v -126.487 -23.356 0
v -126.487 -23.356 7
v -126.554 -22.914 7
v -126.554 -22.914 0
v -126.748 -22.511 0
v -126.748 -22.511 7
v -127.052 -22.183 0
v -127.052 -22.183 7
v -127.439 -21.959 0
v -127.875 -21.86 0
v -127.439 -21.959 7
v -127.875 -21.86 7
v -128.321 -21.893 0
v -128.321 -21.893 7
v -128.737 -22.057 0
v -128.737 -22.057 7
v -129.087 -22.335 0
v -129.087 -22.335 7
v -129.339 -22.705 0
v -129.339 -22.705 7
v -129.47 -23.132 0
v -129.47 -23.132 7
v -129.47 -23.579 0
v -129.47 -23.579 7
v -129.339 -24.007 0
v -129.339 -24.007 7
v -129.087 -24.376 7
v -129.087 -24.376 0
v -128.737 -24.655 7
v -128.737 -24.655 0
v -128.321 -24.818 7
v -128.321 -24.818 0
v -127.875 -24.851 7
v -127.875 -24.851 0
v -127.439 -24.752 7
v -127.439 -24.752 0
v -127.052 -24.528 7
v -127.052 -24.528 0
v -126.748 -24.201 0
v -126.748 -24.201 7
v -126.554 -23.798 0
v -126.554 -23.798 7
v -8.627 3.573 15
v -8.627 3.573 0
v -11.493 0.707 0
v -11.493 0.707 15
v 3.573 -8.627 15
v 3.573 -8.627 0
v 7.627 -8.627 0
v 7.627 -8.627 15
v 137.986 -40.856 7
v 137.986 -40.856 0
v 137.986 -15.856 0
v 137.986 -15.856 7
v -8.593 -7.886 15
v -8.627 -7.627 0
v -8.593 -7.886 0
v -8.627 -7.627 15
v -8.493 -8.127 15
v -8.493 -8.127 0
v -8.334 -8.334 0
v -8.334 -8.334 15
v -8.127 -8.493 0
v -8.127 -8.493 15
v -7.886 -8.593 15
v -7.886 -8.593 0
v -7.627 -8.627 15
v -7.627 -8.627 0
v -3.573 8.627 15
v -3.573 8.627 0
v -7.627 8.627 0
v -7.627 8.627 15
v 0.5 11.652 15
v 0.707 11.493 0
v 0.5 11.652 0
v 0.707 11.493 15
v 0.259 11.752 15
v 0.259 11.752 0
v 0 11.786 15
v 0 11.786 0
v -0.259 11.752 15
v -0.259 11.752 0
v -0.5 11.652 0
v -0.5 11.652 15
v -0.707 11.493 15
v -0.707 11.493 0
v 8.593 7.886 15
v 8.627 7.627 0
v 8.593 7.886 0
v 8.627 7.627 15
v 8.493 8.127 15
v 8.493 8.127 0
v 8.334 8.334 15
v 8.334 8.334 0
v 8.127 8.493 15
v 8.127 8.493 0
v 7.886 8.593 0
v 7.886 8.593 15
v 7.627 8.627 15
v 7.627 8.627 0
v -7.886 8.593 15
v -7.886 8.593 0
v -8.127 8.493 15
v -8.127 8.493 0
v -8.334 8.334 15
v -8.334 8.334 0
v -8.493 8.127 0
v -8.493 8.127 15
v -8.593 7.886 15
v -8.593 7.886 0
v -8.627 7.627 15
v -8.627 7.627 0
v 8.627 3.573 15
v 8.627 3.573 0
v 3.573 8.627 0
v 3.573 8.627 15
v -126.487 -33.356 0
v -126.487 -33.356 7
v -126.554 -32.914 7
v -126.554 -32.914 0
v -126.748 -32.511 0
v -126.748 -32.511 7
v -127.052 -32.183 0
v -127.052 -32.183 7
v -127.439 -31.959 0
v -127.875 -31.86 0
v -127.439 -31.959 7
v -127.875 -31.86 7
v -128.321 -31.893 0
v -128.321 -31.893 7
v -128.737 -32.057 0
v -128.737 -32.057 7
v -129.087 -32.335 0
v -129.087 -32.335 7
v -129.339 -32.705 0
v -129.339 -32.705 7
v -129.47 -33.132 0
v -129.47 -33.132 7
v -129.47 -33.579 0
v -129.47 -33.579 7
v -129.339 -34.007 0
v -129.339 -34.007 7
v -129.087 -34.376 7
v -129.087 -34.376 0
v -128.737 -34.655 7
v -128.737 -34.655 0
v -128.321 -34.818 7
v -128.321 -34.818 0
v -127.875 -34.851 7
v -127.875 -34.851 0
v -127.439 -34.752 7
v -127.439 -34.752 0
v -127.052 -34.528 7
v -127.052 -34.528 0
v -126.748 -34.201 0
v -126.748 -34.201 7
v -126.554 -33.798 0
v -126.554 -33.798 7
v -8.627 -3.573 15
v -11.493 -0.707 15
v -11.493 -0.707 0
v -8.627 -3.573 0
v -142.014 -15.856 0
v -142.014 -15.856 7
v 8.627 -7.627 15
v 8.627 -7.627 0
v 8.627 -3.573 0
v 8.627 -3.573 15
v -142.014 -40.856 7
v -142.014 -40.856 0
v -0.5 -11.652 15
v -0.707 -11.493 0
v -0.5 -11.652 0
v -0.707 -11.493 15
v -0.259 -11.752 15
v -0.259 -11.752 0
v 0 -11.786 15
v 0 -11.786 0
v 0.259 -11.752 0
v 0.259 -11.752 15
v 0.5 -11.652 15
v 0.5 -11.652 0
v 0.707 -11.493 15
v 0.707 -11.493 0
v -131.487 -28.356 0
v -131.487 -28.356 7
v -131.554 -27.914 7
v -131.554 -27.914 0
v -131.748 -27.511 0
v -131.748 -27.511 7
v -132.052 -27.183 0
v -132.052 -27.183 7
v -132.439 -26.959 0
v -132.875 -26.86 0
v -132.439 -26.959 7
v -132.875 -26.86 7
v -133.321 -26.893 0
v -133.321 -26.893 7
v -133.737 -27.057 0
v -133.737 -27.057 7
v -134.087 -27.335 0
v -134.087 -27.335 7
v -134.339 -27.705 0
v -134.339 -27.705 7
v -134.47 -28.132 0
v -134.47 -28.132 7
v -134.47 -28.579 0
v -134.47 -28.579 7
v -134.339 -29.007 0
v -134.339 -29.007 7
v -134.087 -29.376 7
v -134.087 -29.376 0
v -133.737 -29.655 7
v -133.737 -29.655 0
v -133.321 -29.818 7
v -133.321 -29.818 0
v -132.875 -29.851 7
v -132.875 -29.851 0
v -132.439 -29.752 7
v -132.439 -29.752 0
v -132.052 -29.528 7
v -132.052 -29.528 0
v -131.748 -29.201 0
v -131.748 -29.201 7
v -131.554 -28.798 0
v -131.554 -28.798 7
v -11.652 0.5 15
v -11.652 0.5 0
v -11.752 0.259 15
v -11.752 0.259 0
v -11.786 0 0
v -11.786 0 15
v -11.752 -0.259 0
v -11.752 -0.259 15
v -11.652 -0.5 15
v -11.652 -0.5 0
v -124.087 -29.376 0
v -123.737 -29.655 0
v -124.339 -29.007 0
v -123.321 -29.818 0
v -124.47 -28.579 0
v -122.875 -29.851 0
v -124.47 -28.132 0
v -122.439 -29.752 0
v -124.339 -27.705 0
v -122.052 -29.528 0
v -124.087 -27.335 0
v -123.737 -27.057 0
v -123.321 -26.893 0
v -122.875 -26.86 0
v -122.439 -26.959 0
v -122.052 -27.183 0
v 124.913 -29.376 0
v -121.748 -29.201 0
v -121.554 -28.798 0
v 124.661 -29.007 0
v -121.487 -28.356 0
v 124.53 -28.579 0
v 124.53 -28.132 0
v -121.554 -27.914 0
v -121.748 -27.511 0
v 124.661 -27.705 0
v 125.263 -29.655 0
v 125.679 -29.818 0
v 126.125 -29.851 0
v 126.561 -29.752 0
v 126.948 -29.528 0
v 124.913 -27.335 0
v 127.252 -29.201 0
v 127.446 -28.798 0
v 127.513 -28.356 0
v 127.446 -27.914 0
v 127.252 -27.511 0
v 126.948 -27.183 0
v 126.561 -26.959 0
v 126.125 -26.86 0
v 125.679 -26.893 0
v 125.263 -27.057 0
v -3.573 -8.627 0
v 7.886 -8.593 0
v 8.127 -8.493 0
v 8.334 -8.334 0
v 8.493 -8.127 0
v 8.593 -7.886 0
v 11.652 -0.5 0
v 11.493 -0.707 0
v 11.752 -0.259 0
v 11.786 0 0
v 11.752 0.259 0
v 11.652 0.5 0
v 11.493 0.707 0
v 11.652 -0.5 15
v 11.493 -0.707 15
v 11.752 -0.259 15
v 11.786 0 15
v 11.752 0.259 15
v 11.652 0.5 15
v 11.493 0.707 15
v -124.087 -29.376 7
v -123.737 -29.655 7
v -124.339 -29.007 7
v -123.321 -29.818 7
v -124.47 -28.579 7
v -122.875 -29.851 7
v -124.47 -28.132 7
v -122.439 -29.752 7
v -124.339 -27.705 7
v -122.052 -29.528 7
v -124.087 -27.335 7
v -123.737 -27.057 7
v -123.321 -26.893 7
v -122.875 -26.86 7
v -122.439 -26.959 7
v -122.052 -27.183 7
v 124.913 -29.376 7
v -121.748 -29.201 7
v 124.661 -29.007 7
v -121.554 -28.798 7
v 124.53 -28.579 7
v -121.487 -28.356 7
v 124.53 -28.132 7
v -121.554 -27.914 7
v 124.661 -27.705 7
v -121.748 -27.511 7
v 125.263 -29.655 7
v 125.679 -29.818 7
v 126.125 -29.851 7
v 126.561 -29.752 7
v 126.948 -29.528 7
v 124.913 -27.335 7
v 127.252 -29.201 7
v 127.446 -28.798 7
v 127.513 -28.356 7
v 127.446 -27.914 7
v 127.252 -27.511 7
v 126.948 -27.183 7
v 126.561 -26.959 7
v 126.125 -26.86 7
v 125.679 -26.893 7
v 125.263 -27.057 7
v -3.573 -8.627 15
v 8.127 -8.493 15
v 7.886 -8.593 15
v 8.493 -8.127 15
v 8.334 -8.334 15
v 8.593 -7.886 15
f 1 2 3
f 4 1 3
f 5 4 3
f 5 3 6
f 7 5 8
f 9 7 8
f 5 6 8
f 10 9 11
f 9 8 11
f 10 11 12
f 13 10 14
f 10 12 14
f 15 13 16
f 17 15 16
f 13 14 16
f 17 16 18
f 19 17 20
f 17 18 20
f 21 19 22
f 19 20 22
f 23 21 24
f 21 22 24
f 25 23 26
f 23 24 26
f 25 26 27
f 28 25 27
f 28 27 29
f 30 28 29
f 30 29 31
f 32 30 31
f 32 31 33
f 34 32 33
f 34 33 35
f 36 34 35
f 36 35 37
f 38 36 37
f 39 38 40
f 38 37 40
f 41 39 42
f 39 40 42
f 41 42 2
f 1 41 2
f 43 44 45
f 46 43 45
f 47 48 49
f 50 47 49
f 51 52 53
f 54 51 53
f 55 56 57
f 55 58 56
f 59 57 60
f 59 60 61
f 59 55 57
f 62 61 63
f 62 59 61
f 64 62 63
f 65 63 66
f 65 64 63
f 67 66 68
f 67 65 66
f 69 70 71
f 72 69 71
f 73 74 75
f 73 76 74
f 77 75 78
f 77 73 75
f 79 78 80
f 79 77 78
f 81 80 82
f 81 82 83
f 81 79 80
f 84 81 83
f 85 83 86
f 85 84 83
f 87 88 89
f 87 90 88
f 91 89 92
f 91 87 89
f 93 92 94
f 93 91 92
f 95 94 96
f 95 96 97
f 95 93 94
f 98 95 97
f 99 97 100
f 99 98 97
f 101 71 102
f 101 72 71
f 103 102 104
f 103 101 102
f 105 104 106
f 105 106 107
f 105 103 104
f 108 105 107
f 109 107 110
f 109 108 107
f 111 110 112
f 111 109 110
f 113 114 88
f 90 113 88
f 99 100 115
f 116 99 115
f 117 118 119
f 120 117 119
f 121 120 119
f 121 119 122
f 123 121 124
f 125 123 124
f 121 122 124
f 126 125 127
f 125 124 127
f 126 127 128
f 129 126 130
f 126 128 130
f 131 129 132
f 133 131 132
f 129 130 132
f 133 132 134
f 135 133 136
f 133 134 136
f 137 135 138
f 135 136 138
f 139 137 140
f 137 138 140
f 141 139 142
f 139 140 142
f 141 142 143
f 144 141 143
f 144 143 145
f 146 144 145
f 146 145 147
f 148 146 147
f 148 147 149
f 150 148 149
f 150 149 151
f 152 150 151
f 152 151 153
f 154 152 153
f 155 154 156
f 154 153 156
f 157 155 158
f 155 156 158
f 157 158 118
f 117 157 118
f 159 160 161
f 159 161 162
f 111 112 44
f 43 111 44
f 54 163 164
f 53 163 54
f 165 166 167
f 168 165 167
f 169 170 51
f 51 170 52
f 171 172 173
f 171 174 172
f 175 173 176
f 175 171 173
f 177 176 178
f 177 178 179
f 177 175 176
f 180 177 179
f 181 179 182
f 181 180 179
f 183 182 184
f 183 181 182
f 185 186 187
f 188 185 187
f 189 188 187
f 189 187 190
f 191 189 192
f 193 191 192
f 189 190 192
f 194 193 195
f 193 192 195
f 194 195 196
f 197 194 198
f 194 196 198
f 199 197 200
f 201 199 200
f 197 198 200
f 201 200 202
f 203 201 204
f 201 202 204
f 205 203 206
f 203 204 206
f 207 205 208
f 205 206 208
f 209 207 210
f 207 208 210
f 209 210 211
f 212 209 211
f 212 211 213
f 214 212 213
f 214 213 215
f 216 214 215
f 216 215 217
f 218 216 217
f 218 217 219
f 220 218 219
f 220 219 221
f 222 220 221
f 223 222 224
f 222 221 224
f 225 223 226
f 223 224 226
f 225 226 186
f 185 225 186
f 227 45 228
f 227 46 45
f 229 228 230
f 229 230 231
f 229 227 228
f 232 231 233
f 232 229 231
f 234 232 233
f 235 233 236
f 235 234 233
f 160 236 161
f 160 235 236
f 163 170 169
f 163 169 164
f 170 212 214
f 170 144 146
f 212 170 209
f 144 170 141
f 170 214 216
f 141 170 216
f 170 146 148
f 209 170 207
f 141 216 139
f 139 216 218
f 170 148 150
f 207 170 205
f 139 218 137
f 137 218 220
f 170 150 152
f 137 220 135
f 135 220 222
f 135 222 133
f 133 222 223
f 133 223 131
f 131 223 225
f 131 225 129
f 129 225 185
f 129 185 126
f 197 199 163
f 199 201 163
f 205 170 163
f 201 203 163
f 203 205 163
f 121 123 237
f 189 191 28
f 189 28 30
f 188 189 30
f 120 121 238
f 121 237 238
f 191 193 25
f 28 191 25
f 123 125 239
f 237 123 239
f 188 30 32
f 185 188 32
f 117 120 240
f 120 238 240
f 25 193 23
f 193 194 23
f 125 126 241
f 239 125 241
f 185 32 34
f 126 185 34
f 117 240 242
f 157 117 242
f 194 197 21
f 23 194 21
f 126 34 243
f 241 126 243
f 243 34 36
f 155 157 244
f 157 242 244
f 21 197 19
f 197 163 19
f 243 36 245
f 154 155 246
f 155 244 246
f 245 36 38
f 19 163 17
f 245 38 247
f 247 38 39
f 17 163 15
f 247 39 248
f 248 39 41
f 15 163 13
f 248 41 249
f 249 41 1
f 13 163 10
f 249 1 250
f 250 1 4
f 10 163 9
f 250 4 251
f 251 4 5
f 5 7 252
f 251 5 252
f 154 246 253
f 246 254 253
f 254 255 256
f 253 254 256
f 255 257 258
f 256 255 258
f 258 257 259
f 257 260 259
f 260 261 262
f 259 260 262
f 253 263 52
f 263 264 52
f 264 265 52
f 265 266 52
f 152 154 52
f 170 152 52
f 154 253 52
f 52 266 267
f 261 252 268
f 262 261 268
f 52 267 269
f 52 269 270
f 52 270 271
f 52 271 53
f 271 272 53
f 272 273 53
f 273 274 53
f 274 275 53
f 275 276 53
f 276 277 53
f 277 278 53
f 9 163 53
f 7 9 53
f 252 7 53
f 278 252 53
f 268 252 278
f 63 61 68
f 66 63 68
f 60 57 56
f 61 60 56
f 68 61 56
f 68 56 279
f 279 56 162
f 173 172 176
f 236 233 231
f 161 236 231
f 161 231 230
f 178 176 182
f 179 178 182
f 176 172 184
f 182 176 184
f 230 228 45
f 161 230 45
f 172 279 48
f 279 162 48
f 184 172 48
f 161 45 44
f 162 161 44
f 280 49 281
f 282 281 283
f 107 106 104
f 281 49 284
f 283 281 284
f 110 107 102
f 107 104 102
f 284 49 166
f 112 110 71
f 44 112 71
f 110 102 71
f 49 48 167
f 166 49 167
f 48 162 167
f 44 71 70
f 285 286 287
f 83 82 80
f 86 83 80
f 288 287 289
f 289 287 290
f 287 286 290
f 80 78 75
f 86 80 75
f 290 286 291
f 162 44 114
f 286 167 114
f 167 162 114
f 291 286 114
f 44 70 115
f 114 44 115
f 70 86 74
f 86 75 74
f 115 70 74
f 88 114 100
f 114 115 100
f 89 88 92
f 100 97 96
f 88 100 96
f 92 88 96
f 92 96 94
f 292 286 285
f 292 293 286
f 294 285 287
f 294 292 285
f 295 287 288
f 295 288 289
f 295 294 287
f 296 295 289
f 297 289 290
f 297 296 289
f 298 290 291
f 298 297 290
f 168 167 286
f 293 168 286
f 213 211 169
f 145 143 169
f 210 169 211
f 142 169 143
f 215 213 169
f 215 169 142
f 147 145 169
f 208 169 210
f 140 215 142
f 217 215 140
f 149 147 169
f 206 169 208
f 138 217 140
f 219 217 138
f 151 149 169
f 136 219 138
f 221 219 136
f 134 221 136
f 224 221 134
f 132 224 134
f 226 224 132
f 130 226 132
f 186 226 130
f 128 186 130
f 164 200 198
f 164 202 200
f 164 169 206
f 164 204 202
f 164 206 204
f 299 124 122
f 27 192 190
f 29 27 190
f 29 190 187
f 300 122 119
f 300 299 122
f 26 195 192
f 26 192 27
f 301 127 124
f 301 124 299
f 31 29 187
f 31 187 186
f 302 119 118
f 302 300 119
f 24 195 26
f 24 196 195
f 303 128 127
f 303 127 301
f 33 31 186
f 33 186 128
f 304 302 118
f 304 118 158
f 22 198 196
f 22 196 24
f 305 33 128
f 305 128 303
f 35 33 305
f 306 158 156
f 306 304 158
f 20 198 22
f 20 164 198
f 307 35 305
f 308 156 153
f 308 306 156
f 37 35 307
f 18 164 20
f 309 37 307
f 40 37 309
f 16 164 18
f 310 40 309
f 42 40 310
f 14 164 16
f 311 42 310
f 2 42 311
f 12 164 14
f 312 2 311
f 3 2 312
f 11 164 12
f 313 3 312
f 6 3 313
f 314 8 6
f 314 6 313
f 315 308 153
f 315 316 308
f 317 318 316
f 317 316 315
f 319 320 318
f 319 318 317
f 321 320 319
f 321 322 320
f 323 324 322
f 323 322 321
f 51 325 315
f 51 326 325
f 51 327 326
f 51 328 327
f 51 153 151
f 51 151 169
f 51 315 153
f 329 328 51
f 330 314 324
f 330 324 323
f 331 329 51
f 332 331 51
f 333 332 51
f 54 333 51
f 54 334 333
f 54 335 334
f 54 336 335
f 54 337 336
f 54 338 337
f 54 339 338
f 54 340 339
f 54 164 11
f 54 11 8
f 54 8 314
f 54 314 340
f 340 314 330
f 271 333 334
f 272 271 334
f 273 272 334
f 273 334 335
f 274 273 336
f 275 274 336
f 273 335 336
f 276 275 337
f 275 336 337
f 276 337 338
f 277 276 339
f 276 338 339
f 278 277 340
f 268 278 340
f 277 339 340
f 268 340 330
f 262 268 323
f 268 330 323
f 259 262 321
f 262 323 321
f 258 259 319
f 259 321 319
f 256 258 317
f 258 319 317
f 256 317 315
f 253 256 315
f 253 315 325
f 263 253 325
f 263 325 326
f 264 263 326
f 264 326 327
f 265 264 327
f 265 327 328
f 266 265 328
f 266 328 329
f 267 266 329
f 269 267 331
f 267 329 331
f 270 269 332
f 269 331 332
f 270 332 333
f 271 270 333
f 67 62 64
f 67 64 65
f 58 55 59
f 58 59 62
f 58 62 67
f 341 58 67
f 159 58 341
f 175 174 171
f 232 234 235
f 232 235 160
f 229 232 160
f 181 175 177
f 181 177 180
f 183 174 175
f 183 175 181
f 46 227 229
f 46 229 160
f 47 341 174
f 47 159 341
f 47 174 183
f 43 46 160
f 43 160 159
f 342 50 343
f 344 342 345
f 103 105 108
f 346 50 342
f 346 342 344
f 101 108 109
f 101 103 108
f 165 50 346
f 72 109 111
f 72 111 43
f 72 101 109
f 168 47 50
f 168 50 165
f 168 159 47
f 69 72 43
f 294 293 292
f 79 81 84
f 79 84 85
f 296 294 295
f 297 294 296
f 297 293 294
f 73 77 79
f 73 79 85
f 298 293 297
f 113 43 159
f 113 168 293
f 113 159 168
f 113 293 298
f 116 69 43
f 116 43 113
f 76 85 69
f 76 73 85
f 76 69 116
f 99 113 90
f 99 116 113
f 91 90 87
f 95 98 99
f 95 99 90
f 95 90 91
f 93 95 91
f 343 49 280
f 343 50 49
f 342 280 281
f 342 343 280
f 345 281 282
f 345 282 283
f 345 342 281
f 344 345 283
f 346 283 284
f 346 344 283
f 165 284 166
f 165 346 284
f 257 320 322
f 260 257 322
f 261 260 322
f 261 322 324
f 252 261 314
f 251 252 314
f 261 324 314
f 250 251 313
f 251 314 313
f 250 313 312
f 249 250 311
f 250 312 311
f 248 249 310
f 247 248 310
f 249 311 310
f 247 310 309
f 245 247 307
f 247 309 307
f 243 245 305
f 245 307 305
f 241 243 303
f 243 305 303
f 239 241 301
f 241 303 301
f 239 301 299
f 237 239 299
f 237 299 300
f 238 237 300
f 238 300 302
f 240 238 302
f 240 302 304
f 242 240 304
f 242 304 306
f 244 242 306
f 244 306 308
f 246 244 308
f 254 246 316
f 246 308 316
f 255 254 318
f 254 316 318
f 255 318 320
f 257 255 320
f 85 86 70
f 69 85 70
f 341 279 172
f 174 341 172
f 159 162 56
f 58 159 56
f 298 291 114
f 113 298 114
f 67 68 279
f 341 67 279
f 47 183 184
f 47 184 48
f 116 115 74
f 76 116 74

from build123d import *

# Parameters (mm, degrees)
F1_DEPTH = 15
F4_R     = 1
F5_W     = 280
F5_H     = 25
F6_DEPTH = 7
F8_R     = 1.5
F9_DEPTH = 7


with BuildPart() as f1:
    # F0 (on Top) → F1 (new body)
    with BuildSketch(Plane.XY):
        Polygon((-3.5732972695, 8.6267027305), (-8.6267027305, 8.6267027305), (-8.6267027305, 3.5732972695), align=None)
        Polygon((0, 12.2), (-3.5732972695, 8.6267027305), (3.5732972695, 8.6267027305), align=None)
        Polygon((3.5732972695, 8.6267027305), (-3.5732972695, 8.6267027305), (-8.6267027305, 3.5732972695), (-8.6267027305, -3.5732972695), (-3.5732972695, -8.6267027305), (3.5732972695, -8.6267027305), (8.6267027305, -3.5732972695), (8.6267027305, 3.5732972695), align=None)
        Polygon((-8.6267027305, -3.5732972695), (-8.6267027305, 3.5732972695), (-12.2, 0), align=None)
        Polygon((8.6267027305, 8.6267027305), (3.5732972695, 8.6267027305), (8.6267027305, 3.5732972695), align=None)
        Polygon((-3.5732972695, -8.6267027305), (-8.6267027305, -3.5732972695), (-8.6267027305, -8.6267027305), align=None)
        Polygon((12.2, 0), (8.6267027305, 3.5732972695), (8.6267027305, -3.5732972695), align=None)
        Polygon((3.5732972695, -8.6267027305), (-3.5732972695, -8.6267027305), (0, -12.2), align=None)
        Polygon((8.6267027305, -8.6267027305), (8.6267027305, -3.5732972695), (3.5732972695, -8.6267027305), align=None)
    extrude(amount=F1_DEPTH)

    # F4
    f4_edges = [f1.edges().sort_by_distance(p)[0] for p in [
        (8.626703, 8.626703, 7.5),
        (-8.626703, 8.626703, 7.5),
        (12.2, 0, 7.5),
        (8.626703, -8.626703, 7.5),
        (0, -12.2, 7.5),
        (-12.2, 0, 7.5),
        (-8.626703, -8.626703, 7.5),
        (0, 12.2, 7.5),
    ]]
    fillet(f4_edges, radius=F4_R)


with BuildPart() as f6:
    # F5 (on Top) → F6 (new body)
    with BuildSketch(Plane.XY):
        with Locations((-2.0142327994, -28.3556932964)):
            Rectangle(F5_W, F5_H)
    extrude(amount=F6_DEPTH)

    # F8 (on face) → F9 (cut, through all)
    with BuildSketch(Plane.XY.offset(7)):
        with Locations((-127.9870820045, -23.3556932964)):
            Circle(F8_R)
        with Locations((-132.9870820045, -28.3556932964)):
            Circle(F8_R)
        with Locations((-122.9870820045, -28.3556932964)):
            Circle(F8_R)
        with Locations((-127.9870820045, -33.3556932964)):
            Circle(F8_R)
        with Locations((126.0129179955, -28.3556932964)):
            Circle(F8_R)
    extrude(amount=-F9_DEPTH, mode=Mode.SUBTRACT)


solid = Compound([f1.part, f6.part])
